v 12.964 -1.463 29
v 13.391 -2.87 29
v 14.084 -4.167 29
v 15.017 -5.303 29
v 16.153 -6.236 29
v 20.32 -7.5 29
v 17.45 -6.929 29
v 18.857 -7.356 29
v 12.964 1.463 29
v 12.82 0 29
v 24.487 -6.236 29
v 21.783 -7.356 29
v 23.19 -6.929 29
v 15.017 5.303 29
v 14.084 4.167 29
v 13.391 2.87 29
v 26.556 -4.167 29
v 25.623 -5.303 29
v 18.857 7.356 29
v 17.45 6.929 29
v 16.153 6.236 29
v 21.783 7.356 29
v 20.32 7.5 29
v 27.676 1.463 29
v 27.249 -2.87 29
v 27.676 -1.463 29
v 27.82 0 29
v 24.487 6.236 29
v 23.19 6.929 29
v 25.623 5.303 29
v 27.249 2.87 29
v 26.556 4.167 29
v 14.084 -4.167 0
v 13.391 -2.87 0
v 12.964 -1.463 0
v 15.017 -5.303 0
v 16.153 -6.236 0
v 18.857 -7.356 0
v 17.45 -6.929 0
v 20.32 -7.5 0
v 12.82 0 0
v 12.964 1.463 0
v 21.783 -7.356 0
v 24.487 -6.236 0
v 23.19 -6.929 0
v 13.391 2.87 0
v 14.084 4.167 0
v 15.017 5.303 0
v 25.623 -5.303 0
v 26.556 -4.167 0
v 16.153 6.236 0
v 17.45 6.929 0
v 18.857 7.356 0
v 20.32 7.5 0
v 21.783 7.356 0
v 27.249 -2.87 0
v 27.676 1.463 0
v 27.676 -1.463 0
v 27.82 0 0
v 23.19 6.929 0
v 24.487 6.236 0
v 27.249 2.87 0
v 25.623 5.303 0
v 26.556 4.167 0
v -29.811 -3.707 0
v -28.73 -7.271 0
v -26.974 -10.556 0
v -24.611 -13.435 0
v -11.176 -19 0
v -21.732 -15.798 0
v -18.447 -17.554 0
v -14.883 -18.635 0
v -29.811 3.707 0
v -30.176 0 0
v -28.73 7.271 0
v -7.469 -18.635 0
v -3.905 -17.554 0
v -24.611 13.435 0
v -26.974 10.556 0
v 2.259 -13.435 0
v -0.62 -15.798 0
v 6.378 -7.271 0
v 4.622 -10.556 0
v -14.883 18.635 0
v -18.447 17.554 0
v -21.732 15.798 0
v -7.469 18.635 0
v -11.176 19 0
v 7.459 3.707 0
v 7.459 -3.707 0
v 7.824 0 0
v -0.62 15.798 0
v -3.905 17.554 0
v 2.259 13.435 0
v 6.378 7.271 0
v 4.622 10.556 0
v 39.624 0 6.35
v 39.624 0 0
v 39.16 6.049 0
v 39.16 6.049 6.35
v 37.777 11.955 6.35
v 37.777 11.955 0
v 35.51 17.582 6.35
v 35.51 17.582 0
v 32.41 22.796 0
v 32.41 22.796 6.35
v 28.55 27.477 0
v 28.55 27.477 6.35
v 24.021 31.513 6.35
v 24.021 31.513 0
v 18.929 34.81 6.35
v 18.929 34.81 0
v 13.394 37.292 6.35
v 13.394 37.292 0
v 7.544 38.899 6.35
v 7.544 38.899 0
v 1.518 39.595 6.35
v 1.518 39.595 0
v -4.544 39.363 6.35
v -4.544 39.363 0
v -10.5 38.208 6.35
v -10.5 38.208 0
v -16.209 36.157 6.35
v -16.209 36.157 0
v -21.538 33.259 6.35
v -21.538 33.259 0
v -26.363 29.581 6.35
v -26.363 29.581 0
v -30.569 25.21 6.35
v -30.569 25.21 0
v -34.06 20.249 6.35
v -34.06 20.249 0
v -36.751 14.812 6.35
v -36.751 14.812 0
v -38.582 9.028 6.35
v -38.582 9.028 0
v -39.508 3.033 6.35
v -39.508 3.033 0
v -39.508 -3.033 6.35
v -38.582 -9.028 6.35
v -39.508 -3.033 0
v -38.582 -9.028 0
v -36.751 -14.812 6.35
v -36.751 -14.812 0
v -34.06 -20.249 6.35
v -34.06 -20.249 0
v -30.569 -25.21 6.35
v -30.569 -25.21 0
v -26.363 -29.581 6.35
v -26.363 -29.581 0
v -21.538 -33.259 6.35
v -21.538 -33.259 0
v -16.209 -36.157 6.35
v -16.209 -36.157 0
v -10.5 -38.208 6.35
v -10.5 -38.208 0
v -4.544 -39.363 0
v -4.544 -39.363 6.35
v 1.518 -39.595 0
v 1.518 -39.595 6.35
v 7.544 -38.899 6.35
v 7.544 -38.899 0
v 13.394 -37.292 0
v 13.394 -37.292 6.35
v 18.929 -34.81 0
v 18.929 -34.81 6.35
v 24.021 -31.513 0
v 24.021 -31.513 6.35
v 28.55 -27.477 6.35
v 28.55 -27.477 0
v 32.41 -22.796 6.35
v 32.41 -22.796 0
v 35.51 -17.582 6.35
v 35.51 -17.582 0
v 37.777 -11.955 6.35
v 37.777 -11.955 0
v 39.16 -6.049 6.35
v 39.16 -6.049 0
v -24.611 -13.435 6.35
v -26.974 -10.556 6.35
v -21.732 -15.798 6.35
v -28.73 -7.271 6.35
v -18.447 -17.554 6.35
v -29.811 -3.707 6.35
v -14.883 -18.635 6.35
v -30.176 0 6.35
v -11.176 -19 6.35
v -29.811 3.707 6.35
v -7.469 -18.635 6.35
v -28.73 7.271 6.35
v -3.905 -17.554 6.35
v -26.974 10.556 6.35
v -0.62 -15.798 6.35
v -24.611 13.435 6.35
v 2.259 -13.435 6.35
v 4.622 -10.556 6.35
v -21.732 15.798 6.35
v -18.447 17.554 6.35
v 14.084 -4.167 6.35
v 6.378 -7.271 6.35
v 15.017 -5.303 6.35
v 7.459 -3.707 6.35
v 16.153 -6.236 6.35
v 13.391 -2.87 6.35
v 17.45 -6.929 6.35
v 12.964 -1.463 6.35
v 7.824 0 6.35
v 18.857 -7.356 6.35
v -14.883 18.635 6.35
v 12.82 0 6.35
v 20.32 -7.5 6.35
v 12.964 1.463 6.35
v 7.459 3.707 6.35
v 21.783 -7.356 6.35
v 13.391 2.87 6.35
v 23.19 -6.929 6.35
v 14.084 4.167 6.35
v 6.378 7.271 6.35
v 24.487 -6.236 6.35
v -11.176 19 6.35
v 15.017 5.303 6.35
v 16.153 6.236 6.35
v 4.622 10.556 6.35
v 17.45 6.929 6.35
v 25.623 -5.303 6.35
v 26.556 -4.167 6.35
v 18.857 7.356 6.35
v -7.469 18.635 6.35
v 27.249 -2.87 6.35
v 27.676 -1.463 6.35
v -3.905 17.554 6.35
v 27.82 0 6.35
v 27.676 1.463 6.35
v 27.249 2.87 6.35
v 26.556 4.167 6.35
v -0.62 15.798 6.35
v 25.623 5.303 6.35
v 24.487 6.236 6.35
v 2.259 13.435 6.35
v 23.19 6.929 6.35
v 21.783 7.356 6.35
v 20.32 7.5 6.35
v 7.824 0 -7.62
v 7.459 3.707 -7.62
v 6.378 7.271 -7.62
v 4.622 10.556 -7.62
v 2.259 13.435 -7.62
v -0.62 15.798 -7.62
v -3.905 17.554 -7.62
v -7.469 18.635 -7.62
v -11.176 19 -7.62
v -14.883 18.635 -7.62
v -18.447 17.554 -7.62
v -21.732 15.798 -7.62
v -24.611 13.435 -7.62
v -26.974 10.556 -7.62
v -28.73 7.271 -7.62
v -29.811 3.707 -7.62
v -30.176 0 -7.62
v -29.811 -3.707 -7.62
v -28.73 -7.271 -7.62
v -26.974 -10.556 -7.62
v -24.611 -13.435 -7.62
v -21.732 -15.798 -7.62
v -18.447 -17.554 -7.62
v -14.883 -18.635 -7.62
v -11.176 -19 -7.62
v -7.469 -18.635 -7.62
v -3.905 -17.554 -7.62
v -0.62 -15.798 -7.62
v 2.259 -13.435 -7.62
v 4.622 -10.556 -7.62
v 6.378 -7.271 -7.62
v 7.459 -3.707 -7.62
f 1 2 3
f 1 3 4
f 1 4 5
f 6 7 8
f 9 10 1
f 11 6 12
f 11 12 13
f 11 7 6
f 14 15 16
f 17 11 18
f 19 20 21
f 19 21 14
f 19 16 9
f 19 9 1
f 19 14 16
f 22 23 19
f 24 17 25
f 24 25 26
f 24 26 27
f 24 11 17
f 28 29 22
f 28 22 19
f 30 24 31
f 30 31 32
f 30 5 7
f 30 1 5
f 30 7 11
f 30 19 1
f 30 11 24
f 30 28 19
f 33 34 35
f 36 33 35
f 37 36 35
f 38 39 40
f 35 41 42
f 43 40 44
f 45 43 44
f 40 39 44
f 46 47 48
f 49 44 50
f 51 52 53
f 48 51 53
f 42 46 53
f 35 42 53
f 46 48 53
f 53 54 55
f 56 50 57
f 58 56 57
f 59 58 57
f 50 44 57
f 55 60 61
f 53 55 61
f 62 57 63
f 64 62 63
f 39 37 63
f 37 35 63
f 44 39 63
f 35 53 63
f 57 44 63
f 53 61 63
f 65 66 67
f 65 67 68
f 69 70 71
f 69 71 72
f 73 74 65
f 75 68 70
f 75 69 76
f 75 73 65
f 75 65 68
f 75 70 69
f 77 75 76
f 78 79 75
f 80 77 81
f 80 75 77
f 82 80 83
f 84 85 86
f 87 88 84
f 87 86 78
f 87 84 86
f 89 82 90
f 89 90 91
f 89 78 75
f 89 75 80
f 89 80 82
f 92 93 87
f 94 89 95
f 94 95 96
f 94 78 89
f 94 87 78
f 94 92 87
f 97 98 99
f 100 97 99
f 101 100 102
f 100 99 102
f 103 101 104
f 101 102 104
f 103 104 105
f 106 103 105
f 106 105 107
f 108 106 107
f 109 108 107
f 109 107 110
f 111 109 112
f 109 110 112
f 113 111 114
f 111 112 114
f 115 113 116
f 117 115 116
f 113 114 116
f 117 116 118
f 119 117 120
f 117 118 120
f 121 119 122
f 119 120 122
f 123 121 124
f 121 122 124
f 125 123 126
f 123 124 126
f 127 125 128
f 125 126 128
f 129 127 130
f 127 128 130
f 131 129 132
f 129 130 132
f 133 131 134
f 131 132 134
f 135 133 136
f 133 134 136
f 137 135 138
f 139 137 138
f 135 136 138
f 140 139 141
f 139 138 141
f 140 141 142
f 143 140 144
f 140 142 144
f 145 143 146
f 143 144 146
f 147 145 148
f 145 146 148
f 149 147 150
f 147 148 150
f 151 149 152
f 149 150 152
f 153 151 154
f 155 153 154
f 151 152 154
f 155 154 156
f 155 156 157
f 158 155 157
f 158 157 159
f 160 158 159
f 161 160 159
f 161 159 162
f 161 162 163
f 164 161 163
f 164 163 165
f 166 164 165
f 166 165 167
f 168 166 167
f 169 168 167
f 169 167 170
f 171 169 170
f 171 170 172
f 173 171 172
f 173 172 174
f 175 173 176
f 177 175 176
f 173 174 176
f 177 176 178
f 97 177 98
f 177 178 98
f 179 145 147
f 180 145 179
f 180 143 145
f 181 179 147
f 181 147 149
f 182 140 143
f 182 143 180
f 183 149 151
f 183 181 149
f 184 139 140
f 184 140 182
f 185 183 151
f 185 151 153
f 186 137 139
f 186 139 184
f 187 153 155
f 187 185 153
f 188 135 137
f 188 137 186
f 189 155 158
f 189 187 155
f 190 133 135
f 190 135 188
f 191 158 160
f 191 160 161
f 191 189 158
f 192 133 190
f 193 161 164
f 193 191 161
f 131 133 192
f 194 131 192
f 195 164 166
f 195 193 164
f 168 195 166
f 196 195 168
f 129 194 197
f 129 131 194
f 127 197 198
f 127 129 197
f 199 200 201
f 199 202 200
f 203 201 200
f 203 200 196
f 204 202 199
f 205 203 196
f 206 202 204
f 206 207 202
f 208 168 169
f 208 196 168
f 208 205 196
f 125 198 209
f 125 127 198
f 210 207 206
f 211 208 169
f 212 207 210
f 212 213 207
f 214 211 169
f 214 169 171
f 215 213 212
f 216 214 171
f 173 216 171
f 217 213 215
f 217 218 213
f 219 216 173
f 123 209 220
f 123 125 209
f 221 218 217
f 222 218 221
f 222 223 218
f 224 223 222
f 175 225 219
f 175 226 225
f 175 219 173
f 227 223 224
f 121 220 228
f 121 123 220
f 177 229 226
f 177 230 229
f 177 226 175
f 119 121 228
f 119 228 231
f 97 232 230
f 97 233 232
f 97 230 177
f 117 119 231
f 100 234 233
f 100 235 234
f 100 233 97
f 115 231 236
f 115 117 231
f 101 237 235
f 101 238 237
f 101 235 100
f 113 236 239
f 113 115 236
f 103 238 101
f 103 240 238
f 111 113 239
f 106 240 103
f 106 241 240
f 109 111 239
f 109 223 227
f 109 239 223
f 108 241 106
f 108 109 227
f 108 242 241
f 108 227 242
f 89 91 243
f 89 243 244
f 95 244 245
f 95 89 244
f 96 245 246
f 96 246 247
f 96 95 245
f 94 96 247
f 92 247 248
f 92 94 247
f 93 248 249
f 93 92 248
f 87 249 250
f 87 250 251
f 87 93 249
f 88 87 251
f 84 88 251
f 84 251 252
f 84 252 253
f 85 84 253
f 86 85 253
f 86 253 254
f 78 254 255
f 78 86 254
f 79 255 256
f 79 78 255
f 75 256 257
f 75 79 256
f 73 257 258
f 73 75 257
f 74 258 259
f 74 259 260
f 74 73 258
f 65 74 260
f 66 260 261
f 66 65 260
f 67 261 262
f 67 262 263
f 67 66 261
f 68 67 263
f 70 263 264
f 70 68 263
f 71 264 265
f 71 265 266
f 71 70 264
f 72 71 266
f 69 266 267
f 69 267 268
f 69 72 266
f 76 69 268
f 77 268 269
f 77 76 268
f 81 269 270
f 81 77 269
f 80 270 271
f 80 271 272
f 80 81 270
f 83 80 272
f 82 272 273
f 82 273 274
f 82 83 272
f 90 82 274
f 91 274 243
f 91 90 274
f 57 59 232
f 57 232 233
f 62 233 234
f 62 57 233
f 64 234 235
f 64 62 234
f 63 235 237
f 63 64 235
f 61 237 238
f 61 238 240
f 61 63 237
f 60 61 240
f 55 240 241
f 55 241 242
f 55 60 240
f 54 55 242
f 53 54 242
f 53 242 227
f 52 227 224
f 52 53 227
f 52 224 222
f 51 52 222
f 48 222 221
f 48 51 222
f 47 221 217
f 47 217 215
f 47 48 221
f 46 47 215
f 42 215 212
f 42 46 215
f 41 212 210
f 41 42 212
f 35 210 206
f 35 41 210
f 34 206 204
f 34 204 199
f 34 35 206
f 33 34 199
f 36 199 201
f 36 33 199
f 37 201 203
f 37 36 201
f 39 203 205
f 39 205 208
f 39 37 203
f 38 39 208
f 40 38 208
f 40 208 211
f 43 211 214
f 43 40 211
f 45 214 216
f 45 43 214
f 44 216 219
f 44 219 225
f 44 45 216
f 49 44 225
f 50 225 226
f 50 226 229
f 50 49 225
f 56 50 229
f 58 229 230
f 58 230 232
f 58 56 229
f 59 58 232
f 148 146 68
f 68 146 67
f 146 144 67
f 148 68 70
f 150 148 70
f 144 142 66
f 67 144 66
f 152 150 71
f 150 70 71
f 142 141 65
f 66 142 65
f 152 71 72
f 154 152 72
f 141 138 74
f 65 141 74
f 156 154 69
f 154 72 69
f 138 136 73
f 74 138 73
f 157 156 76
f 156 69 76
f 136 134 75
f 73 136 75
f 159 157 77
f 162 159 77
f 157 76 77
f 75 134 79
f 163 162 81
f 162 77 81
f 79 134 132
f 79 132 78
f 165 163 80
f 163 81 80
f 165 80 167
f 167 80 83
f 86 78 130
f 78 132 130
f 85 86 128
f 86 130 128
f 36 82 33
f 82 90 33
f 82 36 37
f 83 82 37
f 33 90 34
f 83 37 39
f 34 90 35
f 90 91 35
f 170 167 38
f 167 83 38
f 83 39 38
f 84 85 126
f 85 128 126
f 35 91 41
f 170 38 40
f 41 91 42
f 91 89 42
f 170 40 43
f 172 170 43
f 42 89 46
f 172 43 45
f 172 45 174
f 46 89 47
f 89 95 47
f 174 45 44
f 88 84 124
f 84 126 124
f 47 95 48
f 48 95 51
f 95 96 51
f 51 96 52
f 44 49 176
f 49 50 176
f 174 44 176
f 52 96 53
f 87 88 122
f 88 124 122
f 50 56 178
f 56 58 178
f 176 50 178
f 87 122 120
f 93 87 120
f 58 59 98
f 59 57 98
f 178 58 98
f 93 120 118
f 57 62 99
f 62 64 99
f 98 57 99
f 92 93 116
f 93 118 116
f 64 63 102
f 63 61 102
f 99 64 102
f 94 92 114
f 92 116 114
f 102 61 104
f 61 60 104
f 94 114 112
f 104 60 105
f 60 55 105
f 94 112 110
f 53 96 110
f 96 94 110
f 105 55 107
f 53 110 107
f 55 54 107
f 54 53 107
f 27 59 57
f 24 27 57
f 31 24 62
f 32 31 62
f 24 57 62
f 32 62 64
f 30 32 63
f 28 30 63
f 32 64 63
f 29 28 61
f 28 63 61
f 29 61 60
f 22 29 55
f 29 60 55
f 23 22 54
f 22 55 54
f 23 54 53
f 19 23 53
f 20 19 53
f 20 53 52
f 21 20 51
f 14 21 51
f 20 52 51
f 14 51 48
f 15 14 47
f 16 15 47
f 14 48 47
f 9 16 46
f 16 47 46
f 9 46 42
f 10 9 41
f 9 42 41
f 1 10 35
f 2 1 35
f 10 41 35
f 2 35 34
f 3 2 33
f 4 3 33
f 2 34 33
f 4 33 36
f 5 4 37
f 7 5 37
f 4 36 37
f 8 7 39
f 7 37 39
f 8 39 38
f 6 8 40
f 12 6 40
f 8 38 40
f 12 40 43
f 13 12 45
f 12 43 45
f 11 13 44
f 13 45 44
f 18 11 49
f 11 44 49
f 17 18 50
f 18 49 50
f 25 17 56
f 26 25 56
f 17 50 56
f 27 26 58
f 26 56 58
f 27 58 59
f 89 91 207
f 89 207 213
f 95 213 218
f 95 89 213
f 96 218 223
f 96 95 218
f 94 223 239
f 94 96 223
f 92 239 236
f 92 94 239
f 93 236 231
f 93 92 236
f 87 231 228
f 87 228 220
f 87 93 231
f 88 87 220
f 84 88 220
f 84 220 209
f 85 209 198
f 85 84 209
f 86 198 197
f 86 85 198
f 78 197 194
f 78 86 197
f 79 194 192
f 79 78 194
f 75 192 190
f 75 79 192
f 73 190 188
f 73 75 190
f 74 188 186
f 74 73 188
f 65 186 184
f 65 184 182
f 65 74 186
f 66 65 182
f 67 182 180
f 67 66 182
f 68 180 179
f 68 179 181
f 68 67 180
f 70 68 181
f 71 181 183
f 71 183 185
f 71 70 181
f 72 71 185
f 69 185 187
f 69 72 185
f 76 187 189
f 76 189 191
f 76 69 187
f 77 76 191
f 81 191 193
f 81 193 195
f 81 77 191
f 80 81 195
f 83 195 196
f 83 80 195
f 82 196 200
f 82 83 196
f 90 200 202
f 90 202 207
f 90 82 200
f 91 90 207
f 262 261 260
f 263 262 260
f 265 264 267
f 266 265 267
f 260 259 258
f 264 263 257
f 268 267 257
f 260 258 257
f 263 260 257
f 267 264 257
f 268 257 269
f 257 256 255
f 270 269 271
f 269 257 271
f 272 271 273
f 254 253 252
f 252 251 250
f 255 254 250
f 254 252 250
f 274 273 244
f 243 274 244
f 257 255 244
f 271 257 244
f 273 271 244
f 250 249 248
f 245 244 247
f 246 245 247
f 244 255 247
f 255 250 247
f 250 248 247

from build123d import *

# Parameters (mm, degrees)
F0_R     = 39.624
F0_R_2   = 19
F0_R_3   = 7.5
F1_DEPTH = 6.35
F2_R     = 7.5
F3_DEPTH = 29
F4_R     = 19
F5_DEPTH = 7.62


with BuildPart() as f1:
    # F0 (on Top) → F1 (new body)
    with BuildSketch(Plane.XY):
        Circle(F0_R)
        with Locations((-11.176, 0)):
            Circle(F0_R_2, mode=Mode.SUBTRACT)
        with Locations((20.32, 0)):
            Circle(F0_R_3, mode=Mode.SUBTRACT)
    extrude(amount=F1_DEPTH)


with BuildPart() as f3:
    # F2 (on Top) → F3 (new body)
    with BuildSketch(Plane.XY):
        with Locations((20.32, 0)):
            Circle(F2_R)
    extrude(amount=F3_DEPTH)


with BuildPart() as f5:
    # F4 (on Top) → F5 (new body)
    with BuildSketch(Plane.XY):
        with Locations((-11.176, 0)):
            Circle(F4_R)
    extrude(amount=-F5_DEPTH)


solid = Compound([f1.part, f3.part, f5.part])
